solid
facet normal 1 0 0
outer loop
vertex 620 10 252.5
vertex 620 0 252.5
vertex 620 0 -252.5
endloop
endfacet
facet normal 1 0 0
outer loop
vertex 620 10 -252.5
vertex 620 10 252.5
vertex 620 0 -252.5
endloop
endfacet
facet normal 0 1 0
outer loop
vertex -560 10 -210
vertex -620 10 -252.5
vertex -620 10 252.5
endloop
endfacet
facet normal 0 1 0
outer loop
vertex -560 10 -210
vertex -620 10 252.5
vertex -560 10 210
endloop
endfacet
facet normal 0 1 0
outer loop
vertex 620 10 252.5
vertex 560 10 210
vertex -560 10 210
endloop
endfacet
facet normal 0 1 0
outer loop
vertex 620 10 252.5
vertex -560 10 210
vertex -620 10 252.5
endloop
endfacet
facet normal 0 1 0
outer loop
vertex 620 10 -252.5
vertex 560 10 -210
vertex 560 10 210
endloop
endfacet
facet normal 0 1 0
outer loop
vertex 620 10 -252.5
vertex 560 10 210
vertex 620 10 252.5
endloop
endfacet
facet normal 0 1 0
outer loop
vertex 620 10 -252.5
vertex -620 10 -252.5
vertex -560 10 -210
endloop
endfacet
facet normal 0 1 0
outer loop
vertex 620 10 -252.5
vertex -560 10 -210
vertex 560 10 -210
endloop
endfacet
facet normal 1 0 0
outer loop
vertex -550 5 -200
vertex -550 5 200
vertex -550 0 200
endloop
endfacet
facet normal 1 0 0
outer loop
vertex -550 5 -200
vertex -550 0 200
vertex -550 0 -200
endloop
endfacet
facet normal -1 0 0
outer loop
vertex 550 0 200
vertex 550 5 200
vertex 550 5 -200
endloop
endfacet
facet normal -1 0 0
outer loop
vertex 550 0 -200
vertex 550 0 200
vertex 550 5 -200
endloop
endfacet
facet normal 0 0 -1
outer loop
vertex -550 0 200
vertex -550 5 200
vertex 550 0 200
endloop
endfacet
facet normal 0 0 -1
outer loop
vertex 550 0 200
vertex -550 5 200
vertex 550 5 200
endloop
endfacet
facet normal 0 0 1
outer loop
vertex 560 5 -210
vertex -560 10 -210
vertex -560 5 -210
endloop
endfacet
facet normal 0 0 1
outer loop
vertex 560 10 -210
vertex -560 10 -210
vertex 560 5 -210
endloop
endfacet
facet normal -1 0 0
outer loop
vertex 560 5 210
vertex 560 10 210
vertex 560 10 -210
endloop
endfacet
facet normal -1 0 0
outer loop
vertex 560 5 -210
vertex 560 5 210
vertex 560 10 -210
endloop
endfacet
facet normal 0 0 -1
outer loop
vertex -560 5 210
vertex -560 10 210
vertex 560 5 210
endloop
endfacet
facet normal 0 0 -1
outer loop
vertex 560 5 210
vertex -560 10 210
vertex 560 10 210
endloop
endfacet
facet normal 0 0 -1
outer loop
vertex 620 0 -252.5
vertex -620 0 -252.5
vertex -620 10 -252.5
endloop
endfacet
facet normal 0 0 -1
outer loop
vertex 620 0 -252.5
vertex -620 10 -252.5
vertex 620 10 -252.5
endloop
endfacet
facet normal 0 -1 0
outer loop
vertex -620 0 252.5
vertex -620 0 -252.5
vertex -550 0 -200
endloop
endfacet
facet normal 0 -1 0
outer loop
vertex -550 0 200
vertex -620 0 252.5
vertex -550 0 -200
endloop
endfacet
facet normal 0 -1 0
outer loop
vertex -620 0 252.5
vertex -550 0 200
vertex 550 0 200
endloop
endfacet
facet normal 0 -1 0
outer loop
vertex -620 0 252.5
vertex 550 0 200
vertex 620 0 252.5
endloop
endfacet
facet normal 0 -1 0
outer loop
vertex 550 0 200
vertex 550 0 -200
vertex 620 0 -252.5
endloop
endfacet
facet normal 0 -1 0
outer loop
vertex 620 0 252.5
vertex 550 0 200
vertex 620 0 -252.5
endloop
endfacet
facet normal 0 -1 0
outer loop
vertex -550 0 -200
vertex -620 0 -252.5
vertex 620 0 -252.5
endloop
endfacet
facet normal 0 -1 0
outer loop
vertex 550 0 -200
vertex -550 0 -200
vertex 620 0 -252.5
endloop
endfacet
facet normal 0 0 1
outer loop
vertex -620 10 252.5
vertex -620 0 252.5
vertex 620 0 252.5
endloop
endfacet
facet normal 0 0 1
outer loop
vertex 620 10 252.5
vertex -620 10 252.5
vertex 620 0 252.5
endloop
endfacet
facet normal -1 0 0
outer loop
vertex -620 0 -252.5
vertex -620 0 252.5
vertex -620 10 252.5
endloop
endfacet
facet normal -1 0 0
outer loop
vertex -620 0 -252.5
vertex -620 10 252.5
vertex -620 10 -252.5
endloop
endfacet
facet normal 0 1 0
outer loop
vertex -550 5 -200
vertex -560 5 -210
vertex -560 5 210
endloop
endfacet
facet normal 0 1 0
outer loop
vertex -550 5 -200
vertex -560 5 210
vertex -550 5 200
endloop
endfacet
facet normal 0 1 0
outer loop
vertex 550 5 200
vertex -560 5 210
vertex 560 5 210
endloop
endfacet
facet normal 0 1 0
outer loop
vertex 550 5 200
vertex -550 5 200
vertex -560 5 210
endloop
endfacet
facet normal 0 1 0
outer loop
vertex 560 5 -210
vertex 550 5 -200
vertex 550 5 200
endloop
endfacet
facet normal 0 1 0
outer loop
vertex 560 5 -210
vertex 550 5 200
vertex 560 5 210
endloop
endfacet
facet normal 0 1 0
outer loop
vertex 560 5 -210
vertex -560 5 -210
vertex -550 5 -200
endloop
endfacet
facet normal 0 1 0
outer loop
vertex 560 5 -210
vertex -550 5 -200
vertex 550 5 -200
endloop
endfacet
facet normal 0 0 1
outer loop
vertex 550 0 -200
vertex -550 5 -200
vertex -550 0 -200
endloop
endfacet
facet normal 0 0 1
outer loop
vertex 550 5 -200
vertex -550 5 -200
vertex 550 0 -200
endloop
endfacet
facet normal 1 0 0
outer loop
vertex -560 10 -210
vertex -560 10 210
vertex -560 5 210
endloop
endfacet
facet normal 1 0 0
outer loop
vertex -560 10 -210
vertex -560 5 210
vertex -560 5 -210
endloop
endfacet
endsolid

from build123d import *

# Parameters (mm, degrees)
SKETCH1_W           = 1240
SKETCH1_H           = 505
BOSS_EXTRUDE1_DEPTH = 10
SKETCH2_W           = 1100
SKETCH2_H           = 400
CUT_EXTRUDE1_DEPTH  = 670.519417194
SKETCH3_W           = 1120
SKETCH3_H           = 420
CUT_EXTRUDE2_DEPTH  = 5


with BuildPart() as part:
    # Sketch1 → Boss-Extrude1 (new body)
    with BuildSketch(Plane(origin=(0, 0, 0), x_dir=(1, 0, 0), z_dir=(0, 1, 0))):
        Rectangle(SKETCH1_W, SKETCH1_H)
    extrude(amount=BOSS_EXTRUDE1_DEPTH)

    # Sketch2 → Cut-Extrude1 (cut, through all)
    with BuildSketch(Plane(origin=(0, 10, 0), x_dir=(1, 0, 0), z_dir=(0, 1, 0))):
        Rectangle(SKETCH2_W, SKETCH2_H)
    extrude(amount=-CUT_EXTRUDE1_DEPTH, mode=Mode.SUBTRACT)

    # Sketch3 → Cut-Extrude2 (cut)
    with BuildSketch(Plane(origin=(0, 10, 0), x_dir=(1, 0, 0), z_dir=(0, 1, 0))):
        Rectangle(SKETCH3_W, SKETCH3_H)
    extrude(amount=-CUT_EXTRUDE2_DEPTH, mode=Mode.SUBTRACT)


solid = part.part
